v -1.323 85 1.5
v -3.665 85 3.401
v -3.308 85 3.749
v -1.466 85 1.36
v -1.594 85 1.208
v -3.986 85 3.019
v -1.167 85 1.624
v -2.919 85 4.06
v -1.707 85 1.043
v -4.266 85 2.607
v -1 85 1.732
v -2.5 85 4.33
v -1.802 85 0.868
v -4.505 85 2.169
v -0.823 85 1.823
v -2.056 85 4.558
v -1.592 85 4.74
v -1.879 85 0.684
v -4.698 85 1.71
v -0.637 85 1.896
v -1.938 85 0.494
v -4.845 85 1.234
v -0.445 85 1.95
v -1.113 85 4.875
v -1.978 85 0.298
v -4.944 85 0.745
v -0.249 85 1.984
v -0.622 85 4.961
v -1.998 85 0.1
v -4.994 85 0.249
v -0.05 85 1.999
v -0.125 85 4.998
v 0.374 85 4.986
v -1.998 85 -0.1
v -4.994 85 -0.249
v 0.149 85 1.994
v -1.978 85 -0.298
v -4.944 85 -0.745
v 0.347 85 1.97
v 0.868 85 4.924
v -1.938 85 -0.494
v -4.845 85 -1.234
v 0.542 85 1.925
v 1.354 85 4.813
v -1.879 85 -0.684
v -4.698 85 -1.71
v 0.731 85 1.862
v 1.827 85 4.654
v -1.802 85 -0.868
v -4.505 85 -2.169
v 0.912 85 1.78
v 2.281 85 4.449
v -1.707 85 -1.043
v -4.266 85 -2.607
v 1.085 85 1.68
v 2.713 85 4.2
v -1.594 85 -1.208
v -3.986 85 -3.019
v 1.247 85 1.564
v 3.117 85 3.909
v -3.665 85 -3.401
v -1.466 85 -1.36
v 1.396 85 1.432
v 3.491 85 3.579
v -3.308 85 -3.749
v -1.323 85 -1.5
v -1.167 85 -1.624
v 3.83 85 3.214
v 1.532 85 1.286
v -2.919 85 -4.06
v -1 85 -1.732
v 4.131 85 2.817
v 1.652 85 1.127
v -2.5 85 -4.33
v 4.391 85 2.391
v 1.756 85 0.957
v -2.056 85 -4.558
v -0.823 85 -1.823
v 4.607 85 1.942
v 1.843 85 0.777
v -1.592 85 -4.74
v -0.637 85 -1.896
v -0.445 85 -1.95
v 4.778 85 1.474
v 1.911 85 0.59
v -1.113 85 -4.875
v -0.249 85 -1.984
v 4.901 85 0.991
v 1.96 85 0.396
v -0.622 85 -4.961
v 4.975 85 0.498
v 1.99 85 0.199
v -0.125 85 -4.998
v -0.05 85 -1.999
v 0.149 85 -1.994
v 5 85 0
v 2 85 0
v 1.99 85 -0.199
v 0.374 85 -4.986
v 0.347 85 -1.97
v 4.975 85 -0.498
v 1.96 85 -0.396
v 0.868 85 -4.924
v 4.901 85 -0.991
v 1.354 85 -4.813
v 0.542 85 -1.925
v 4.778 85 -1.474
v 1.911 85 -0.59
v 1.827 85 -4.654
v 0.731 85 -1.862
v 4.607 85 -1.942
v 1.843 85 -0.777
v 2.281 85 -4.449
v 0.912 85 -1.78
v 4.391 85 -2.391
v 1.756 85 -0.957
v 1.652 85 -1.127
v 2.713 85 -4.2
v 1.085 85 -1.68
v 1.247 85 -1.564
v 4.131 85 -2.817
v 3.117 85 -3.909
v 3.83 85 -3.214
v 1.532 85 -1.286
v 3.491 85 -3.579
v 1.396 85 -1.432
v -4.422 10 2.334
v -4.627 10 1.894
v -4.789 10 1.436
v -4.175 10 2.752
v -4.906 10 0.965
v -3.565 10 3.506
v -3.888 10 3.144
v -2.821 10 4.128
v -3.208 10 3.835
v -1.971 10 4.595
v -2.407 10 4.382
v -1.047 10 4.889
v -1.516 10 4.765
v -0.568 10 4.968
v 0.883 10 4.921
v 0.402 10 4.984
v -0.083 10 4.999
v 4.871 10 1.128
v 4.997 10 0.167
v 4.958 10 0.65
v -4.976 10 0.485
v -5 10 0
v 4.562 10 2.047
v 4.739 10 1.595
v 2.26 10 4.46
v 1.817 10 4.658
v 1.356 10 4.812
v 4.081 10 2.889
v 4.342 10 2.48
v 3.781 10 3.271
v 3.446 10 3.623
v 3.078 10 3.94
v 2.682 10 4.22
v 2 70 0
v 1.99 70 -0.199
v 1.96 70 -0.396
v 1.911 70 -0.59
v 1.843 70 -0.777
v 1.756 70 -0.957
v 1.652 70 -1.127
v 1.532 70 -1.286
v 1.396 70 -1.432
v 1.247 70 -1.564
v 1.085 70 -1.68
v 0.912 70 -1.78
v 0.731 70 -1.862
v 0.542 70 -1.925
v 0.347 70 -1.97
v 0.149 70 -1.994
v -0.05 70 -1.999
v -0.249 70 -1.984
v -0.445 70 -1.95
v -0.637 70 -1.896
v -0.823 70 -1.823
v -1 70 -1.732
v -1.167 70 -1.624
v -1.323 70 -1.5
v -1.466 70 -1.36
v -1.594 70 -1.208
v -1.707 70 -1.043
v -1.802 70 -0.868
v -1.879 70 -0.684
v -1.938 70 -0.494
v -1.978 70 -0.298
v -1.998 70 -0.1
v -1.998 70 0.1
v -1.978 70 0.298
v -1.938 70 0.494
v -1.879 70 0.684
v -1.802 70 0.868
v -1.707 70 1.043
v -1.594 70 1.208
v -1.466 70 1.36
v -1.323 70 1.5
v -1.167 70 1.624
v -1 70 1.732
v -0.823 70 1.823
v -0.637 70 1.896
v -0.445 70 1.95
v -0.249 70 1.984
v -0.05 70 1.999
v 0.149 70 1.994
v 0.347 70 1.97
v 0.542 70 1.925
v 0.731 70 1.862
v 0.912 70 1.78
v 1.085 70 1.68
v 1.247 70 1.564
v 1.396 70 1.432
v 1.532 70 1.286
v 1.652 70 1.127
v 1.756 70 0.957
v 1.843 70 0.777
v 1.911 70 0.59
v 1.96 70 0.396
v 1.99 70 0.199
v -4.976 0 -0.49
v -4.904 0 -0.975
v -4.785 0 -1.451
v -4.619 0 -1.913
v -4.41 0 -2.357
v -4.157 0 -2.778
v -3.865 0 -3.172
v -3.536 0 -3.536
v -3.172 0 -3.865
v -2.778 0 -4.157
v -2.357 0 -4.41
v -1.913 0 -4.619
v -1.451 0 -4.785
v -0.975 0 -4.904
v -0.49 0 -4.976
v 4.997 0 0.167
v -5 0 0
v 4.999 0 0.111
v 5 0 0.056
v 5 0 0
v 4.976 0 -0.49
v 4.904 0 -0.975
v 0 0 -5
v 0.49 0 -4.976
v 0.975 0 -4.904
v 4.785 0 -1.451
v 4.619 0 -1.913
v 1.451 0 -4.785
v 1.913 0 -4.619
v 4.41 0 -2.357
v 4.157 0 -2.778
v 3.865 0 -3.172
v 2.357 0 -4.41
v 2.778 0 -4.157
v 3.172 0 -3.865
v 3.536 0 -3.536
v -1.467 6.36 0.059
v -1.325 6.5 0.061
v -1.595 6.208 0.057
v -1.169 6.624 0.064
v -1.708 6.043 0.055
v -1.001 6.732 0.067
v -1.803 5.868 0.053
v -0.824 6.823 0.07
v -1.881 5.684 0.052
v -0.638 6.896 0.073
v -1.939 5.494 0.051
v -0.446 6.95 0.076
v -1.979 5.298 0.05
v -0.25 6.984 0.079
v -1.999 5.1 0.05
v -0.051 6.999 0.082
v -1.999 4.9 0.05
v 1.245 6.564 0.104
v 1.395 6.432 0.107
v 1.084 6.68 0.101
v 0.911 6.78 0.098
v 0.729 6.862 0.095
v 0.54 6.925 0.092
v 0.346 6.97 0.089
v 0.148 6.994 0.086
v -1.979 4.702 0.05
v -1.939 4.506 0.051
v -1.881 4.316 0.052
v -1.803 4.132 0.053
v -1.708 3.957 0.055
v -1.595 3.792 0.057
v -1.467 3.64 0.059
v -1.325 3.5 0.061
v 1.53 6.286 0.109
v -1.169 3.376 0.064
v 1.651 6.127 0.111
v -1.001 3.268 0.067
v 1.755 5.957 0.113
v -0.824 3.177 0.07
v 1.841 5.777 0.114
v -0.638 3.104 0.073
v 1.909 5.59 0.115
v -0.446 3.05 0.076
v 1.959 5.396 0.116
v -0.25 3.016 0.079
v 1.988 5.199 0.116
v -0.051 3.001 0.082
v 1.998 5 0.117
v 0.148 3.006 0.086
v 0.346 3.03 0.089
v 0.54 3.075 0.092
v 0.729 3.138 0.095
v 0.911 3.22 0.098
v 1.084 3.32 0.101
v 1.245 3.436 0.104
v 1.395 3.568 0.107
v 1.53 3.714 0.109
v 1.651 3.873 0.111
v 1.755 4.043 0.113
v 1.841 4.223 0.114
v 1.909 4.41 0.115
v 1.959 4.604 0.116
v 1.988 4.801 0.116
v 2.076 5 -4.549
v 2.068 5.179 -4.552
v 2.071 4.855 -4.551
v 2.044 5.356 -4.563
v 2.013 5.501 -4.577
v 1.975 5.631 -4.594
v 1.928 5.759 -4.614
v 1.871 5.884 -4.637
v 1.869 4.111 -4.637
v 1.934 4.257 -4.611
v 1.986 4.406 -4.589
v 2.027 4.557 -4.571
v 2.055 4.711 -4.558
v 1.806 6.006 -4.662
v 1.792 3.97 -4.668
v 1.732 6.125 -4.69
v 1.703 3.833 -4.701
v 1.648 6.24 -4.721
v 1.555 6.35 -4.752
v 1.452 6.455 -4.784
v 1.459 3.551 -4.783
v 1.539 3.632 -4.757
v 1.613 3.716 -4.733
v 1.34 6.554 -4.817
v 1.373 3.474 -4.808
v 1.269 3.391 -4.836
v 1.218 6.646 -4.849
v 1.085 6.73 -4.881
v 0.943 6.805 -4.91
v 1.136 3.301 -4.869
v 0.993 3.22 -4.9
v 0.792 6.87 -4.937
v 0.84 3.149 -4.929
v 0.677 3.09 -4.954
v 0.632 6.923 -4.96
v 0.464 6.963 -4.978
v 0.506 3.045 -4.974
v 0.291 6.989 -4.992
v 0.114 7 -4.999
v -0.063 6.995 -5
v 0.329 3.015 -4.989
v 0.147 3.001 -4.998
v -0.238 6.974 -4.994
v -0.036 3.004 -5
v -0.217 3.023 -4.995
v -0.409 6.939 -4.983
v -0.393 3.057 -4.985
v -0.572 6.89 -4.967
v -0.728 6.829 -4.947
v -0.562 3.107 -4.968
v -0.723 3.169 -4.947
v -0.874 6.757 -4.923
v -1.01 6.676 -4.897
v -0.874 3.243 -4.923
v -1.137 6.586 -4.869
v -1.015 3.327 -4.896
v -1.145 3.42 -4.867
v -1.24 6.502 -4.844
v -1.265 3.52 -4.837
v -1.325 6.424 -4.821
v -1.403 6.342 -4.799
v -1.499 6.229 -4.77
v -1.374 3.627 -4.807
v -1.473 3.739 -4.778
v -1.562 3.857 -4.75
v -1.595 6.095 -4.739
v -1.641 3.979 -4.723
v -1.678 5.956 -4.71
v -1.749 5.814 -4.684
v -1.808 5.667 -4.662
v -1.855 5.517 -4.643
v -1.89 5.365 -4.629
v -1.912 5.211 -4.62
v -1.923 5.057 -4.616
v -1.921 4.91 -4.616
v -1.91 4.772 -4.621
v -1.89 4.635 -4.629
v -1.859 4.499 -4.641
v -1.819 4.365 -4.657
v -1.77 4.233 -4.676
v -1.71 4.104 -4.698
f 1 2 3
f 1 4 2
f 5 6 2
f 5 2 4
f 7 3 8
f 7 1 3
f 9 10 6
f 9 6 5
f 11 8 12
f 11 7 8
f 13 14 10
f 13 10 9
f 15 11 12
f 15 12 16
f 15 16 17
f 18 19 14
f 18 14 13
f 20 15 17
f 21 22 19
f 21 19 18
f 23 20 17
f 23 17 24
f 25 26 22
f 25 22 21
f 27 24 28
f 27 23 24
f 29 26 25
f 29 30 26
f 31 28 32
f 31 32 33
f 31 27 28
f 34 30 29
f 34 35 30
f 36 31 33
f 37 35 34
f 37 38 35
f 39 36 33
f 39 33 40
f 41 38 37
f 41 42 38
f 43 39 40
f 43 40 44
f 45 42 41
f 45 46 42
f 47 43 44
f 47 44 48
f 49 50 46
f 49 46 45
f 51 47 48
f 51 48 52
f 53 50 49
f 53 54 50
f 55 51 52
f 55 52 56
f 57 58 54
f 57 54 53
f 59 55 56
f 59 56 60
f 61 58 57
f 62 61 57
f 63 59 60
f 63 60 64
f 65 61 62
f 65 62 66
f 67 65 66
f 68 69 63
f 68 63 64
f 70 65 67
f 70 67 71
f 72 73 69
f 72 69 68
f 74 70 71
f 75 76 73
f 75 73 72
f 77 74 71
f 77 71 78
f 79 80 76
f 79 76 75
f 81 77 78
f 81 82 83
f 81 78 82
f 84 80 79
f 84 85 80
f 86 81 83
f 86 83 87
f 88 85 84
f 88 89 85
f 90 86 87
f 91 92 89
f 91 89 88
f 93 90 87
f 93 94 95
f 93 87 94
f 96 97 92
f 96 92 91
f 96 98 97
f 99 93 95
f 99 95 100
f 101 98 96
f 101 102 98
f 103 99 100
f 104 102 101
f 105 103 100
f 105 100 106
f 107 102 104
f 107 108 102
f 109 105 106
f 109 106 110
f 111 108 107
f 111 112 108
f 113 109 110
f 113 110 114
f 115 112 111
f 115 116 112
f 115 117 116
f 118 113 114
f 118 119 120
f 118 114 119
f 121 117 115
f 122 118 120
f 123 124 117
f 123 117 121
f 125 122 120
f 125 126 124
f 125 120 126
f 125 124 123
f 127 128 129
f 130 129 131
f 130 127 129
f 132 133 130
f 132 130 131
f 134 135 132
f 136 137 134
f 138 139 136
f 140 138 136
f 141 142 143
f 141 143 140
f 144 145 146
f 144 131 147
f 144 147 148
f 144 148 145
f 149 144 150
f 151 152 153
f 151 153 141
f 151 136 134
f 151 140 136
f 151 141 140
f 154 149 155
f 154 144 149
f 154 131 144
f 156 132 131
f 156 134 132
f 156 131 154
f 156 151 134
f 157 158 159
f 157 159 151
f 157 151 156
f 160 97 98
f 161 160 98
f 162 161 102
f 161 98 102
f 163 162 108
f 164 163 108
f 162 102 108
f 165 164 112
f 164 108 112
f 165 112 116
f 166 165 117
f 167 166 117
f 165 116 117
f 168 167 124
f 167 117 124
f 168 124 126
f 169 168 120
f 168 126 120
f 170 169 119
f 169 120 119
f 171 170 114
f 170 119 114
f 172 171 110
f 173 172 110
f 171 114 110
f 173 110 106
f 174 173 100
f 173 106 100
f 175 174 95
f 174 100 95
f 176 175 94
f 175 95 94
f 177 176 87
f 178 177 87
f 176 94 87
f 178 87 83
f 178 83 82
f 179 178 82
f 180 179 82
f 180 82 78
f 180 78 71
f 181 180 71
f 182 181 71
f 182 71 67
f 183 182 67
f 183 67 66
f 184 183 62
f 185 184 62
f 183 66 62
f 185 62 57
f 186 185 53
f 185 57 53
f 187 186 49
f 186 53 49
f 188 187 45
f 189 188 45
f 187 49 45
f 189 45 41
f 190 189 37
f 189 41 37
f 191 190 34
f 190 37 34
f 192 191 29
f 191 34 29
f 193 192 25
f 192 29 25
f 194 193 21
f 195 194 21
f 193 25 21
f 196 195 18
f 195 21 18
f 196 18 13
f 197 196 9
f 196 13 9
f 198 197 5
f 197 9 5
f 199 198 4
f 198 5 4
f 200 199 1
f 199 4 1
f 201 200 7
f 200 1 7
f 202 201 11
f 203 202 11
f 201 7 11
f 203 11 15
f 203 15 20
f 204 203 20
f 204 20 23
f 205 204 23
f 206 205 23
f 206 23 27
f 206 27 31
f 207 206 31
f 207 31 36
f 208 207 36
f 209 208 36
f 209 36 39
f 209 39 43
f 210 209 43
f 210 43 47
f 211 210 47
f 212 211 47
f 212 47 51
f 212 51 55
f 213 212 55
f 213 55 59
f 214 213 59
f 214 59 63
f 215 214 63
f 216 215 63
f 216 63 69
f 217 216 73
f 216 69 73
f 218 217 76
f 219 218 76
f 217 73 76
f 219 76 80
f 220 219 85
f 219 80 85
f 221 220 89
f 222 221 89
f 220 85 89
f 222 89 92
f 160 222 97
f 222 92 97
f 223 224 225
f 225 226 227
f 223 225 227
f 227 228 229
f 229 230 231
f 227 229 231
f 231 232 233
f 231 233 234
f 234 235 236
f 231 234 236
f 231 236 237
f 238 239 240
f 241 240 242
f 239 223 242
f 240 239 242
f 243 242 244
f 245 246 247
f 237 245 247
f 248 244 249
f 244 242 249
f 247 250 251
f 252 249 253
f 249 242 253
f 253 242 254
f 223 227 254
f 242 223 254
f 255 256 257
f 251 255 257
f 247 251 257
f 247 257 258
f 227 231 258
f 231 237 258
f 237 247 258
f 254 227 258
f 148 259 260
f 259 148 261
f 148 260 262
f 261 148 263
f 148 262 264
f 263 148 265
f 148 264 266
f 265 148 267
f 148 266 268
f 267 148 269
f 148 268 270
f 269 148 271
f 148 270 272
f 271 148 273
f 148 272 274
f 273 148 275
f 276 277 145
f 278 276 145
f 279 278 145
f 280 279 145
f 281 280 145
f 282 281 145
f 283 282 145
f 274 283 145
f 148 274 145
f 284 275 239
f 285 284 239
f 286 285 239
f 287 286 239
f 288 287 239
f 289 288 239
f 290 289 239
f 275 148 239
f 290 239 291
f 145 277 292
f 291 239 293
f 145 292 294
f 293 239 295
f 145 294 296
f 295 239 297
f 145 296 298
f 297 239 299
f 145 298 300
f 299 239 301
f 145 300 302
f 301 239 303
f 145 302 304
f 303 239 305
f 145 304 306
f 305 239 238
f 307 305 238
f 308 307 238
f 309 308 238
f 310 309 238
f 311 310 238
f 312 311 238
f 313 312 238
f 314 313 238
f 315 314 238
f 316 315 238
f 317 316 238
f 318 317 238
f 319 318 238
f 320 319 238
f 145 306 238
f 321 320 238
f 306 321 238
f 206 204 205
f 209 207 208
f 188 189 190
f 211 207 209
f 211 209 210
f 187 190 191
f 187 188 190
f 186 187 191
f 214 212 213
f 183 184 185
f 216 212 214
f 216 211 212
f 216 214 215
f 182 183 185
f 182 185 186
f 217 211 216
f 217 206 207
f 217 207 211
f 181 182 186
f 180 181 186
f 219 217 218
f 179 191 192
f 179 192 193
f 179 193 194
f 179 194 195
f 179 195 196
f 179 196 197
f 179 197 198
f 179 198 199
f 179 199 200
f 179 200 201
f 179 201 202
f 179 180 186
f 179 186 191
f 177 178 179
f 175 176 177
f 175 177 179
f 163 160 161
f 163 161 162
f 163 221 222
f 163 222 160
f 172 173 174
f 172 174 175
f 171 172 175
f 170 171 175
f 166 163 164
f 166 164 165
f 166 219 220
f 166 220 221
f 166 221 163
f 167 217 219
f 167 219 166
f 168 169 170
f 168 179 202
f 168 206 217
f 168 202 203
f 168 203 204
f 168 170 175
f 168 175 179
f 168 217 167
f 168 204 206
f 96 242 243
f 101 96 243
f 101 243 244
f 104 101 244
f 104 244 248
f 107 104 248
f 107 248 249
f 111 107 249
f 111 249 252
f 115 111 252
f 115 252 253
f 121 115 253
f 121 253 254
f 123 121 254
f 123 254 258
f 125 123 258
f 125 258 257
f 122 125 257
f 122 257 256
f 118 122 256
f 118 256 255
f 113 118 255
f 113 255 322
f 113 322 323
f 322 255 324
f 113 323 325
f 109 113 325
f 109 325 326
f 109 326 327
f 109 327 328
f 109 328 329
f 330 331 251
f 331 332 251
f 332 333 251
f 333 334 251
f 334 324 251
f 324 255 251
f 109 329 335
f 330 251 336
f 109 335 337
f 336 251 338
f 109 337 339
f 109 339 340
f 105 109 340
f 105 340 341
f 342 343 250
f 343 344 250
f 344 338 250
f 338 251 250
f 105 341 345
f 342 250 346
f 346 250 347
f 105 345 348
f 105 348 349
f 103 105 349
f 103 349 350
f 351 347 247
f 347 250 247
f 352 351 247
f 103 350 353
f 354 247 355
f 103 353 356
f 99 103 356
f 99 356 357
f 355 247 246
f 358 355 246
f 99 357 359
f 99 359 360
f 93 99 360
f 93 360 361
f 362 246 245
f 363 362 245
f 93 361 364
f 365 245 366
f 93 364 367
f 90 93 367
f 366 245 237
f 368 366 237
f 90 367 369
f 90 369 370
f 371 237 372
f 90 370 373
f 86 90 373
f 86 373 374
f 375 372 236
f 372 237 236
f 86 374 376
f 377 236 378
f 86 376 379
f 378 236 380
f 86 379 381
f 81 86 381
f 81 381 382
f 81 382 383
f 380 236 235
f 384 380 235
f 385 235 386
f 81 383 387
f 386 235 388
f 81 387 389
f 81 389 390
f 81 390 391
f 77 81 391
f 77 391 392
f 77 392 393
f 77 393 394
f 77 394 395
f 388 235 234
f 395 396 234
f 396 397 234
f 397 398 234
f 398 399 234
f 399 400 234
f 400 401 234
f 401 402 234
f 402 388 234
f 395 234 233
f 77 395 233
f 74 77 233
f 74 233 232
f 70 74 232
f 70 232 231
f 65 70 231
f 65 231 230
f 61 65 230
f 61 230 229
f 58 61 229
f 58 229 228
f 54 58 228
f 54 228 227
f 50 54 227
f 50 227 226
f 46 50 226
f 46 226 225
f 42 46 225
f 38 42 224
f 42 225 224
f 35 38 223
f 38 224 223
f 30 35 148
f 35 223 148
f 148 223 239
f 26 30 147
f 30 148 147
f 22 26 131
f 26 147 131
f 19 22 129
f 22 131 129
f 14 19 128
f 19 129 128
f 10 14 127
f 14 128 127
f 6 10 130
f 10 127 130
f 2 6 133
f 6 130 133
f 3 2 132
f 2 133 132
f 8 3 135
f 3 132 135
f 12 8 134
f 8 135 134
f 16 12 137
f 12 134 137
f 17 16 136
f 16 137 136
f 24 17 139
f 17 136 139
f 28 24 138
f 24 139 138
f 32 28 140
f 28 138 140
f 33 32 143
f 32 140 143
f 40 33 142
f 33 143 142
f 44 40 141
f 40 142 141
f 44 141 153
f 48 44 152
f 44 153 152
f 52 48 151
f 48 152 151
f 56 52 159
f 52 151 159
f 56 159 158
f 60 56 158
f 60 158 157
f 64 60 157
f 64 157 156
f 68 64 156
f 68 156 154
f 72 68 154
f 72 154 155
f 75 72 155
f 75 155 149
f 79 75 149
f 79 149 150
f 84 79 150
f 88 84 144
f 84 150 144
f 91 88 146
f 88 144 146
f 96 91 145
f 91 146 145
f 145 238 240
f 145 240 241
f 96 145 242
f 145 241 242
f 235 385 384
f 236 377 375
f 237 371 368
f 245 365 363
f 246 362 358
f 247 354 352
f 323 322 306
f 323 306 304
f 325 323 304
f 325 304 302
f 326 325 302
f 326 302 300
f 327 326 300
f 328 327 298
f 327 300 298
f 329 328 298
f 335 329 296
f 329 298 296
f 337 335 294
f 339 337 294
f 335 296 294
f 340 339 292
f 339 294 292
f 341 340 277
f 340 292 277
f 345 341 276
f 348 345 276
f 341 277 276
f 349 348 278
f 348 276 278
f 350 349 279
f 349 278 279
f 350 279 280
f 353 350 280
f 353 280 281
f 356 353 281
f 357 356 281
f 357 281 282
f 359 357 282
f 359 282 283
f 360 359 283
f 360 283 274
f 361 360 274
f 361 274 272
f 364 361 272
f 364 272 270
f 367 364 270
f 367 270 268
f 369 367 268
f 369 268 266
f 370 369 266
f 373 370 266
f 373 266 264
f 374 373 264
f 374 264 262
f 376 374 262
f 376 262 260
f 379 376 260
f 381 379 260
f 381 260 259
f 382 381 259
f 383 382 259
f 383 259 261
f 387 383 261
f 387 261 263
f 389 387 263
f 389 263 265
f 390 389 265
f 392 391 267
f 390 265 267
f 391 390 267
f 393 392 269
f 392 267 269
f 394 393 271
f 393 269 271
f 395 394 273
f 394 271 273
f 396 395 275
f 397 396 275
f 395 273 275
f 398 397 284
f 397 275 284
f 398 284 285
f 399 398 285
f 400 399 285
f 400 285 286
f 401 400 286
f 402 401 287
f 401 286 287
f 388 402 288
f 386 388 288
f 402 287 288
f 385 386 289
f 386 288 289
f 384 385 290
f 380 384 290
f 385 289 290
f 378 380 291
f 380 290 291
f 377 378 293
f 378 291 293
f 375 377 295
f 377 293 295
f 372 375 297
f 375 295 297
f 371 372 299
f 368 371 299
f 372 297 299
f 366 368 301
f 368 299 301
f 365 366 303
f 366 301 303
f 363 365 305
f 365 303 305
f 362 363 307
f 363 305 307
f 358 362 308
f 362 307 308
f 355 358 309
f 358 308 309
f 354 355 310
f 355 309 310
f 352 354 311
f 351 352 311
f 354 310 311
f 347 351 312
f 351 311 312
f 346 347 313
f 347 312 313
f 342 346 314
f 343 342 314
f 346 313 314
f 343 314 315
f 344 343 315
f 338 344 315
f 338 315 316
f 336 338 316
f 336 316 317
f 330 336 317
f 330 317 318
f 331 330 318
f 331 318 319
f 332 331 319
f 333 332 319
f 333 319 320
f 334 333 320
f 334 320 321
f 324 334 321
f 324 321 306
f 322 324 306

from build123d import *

# Parameters (mm, degrees)
SKETCH1_R           = 5
BOSS_EXTRUDE1_DEPTH = 85
SKETCH2_R           = 2
CUT_EXTRUDE1_DEPTH  = 15
CUT_EXTRUDE2_DEPTH  = 10
SKETCH4_R           = 2
CUT_EXTRUDE3_DEPTH  = 6.165903358


with BuildPart() as part:
    # Sketch1 → Boss-Extrude1 (new body)
    with BuildSketch(Plane(origin=(0, 0, 0), x_dir=(1, 0, 0), z_dir=(0, 1, 0))):
        Circle(SKETCH1_R)
    extrude(amount=BOSS_EXTRUDE1_DEPTH)

    # Sketch2 → Cut-Extrude1 (cut)
    with BuildSketch(Plane(origin=(0, 85, 0), x_dir=(1, 0, 0), z_dir=(0, 1, 0))):
        Circle(SKETCH2_R)
    extrude(amount=-CUT_EXTRUDE1_DEPTH, mode=Mode.SUBTRACT)

    # Sketch3 → Cut-Extrude2 (cut)
    with BuildSketch(Plane.XZ):
        with BuildLine():
            Line((-5, 0), (4.997224535, 0.166574151))
            ThreePointArc((4.997224535, 0.166574151), (-0.084674808, 5.081899343), (-5, 0))
        make_face()
    extrude(amount=-CUT_EXTRUDE2_DEPTH, mode=Mode.SUBTRACT)

    # Sketch4 → Cut-Extrude3 (cut, through all)
    with BuildSketch(Plane(origin=(-0.001387733, 0, 0.083287076), x_dir=(0.999861217, 0, 0.016659727), z_dir=(-0.016659727, 0, 0.999861217))):
        with Locations((0, 5)):
            Circle(SKETCH4_R)
    extrude(amount=-CUT_EXTRUDE3_DEPTH, mode=Mode.SUBTRACT)


solid = part.part
